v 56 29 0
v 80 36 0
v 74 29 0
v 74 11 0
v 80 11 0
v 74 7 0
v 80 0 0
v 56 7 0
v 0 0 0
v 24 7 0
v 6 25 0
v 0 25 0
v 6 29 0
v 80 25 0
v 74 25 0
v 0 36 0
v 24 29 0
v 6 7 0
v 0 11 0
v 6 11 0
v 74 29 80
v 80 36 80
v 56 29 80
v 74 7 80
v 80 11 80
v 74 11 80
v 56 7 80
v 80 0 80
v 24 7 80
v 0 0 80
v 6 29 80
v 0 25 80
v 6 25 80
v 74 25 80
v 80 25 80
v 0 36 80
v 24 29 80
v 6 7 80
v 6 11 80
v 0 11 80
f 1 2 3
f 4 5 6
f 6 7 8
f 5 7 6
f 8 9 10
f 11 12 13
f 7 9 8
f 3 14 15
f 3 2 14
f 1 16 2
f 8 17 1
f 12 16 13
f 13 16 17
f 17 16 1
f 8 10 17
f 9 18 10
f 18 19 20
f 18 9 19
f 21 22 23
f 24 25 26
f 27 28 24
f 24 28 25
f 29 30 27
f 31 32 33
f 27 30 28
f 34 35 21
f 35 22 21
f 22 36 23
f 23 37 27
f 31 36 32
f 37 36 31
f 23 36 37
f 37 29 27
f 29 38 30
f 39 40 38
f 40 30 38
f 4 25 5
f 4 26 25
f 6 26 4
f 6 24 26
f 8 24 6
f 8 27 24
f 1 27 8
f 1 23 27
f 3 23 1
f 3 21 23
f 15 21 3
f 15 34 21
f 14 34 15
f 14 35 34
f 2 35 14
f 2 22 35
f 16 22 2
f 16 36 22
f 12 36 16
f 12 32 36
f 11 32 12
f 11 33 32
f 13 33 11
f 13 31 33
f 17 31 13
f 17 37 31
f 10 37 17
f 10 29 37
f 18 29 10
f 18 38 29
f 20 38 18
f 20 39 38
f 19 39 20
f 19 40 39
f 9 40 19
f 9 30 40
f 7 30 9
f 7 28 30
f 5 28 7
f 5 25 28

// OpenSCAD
$fn = 32;

// ----------------------------------------------------------------------
// T-slot rail: 80 x 36 mm section, 80 mm long
// ----------------------------------------------------------------------

// --- parameters (mm) ---
profile_height = 80;      // extrusion height
profile_points = 20;      // points of the closed outline

profile = [[0, 0], [80, 0], [80, 11], [74, 11], [74, 7], [56, 7], [56, 29], [74, 29], [74, 25], [80, 25], [80, 36], [0, 36], [0, 25], [6, 25], [6, 29], [24, 29], [24, 7], [6, 7], [6, 11], [0, 11]];  // single closed polygon, 20 points, counter clockwise

// --- the one profile operation ---
linear_extrude(height = profile_height) polygon(points = profile);
